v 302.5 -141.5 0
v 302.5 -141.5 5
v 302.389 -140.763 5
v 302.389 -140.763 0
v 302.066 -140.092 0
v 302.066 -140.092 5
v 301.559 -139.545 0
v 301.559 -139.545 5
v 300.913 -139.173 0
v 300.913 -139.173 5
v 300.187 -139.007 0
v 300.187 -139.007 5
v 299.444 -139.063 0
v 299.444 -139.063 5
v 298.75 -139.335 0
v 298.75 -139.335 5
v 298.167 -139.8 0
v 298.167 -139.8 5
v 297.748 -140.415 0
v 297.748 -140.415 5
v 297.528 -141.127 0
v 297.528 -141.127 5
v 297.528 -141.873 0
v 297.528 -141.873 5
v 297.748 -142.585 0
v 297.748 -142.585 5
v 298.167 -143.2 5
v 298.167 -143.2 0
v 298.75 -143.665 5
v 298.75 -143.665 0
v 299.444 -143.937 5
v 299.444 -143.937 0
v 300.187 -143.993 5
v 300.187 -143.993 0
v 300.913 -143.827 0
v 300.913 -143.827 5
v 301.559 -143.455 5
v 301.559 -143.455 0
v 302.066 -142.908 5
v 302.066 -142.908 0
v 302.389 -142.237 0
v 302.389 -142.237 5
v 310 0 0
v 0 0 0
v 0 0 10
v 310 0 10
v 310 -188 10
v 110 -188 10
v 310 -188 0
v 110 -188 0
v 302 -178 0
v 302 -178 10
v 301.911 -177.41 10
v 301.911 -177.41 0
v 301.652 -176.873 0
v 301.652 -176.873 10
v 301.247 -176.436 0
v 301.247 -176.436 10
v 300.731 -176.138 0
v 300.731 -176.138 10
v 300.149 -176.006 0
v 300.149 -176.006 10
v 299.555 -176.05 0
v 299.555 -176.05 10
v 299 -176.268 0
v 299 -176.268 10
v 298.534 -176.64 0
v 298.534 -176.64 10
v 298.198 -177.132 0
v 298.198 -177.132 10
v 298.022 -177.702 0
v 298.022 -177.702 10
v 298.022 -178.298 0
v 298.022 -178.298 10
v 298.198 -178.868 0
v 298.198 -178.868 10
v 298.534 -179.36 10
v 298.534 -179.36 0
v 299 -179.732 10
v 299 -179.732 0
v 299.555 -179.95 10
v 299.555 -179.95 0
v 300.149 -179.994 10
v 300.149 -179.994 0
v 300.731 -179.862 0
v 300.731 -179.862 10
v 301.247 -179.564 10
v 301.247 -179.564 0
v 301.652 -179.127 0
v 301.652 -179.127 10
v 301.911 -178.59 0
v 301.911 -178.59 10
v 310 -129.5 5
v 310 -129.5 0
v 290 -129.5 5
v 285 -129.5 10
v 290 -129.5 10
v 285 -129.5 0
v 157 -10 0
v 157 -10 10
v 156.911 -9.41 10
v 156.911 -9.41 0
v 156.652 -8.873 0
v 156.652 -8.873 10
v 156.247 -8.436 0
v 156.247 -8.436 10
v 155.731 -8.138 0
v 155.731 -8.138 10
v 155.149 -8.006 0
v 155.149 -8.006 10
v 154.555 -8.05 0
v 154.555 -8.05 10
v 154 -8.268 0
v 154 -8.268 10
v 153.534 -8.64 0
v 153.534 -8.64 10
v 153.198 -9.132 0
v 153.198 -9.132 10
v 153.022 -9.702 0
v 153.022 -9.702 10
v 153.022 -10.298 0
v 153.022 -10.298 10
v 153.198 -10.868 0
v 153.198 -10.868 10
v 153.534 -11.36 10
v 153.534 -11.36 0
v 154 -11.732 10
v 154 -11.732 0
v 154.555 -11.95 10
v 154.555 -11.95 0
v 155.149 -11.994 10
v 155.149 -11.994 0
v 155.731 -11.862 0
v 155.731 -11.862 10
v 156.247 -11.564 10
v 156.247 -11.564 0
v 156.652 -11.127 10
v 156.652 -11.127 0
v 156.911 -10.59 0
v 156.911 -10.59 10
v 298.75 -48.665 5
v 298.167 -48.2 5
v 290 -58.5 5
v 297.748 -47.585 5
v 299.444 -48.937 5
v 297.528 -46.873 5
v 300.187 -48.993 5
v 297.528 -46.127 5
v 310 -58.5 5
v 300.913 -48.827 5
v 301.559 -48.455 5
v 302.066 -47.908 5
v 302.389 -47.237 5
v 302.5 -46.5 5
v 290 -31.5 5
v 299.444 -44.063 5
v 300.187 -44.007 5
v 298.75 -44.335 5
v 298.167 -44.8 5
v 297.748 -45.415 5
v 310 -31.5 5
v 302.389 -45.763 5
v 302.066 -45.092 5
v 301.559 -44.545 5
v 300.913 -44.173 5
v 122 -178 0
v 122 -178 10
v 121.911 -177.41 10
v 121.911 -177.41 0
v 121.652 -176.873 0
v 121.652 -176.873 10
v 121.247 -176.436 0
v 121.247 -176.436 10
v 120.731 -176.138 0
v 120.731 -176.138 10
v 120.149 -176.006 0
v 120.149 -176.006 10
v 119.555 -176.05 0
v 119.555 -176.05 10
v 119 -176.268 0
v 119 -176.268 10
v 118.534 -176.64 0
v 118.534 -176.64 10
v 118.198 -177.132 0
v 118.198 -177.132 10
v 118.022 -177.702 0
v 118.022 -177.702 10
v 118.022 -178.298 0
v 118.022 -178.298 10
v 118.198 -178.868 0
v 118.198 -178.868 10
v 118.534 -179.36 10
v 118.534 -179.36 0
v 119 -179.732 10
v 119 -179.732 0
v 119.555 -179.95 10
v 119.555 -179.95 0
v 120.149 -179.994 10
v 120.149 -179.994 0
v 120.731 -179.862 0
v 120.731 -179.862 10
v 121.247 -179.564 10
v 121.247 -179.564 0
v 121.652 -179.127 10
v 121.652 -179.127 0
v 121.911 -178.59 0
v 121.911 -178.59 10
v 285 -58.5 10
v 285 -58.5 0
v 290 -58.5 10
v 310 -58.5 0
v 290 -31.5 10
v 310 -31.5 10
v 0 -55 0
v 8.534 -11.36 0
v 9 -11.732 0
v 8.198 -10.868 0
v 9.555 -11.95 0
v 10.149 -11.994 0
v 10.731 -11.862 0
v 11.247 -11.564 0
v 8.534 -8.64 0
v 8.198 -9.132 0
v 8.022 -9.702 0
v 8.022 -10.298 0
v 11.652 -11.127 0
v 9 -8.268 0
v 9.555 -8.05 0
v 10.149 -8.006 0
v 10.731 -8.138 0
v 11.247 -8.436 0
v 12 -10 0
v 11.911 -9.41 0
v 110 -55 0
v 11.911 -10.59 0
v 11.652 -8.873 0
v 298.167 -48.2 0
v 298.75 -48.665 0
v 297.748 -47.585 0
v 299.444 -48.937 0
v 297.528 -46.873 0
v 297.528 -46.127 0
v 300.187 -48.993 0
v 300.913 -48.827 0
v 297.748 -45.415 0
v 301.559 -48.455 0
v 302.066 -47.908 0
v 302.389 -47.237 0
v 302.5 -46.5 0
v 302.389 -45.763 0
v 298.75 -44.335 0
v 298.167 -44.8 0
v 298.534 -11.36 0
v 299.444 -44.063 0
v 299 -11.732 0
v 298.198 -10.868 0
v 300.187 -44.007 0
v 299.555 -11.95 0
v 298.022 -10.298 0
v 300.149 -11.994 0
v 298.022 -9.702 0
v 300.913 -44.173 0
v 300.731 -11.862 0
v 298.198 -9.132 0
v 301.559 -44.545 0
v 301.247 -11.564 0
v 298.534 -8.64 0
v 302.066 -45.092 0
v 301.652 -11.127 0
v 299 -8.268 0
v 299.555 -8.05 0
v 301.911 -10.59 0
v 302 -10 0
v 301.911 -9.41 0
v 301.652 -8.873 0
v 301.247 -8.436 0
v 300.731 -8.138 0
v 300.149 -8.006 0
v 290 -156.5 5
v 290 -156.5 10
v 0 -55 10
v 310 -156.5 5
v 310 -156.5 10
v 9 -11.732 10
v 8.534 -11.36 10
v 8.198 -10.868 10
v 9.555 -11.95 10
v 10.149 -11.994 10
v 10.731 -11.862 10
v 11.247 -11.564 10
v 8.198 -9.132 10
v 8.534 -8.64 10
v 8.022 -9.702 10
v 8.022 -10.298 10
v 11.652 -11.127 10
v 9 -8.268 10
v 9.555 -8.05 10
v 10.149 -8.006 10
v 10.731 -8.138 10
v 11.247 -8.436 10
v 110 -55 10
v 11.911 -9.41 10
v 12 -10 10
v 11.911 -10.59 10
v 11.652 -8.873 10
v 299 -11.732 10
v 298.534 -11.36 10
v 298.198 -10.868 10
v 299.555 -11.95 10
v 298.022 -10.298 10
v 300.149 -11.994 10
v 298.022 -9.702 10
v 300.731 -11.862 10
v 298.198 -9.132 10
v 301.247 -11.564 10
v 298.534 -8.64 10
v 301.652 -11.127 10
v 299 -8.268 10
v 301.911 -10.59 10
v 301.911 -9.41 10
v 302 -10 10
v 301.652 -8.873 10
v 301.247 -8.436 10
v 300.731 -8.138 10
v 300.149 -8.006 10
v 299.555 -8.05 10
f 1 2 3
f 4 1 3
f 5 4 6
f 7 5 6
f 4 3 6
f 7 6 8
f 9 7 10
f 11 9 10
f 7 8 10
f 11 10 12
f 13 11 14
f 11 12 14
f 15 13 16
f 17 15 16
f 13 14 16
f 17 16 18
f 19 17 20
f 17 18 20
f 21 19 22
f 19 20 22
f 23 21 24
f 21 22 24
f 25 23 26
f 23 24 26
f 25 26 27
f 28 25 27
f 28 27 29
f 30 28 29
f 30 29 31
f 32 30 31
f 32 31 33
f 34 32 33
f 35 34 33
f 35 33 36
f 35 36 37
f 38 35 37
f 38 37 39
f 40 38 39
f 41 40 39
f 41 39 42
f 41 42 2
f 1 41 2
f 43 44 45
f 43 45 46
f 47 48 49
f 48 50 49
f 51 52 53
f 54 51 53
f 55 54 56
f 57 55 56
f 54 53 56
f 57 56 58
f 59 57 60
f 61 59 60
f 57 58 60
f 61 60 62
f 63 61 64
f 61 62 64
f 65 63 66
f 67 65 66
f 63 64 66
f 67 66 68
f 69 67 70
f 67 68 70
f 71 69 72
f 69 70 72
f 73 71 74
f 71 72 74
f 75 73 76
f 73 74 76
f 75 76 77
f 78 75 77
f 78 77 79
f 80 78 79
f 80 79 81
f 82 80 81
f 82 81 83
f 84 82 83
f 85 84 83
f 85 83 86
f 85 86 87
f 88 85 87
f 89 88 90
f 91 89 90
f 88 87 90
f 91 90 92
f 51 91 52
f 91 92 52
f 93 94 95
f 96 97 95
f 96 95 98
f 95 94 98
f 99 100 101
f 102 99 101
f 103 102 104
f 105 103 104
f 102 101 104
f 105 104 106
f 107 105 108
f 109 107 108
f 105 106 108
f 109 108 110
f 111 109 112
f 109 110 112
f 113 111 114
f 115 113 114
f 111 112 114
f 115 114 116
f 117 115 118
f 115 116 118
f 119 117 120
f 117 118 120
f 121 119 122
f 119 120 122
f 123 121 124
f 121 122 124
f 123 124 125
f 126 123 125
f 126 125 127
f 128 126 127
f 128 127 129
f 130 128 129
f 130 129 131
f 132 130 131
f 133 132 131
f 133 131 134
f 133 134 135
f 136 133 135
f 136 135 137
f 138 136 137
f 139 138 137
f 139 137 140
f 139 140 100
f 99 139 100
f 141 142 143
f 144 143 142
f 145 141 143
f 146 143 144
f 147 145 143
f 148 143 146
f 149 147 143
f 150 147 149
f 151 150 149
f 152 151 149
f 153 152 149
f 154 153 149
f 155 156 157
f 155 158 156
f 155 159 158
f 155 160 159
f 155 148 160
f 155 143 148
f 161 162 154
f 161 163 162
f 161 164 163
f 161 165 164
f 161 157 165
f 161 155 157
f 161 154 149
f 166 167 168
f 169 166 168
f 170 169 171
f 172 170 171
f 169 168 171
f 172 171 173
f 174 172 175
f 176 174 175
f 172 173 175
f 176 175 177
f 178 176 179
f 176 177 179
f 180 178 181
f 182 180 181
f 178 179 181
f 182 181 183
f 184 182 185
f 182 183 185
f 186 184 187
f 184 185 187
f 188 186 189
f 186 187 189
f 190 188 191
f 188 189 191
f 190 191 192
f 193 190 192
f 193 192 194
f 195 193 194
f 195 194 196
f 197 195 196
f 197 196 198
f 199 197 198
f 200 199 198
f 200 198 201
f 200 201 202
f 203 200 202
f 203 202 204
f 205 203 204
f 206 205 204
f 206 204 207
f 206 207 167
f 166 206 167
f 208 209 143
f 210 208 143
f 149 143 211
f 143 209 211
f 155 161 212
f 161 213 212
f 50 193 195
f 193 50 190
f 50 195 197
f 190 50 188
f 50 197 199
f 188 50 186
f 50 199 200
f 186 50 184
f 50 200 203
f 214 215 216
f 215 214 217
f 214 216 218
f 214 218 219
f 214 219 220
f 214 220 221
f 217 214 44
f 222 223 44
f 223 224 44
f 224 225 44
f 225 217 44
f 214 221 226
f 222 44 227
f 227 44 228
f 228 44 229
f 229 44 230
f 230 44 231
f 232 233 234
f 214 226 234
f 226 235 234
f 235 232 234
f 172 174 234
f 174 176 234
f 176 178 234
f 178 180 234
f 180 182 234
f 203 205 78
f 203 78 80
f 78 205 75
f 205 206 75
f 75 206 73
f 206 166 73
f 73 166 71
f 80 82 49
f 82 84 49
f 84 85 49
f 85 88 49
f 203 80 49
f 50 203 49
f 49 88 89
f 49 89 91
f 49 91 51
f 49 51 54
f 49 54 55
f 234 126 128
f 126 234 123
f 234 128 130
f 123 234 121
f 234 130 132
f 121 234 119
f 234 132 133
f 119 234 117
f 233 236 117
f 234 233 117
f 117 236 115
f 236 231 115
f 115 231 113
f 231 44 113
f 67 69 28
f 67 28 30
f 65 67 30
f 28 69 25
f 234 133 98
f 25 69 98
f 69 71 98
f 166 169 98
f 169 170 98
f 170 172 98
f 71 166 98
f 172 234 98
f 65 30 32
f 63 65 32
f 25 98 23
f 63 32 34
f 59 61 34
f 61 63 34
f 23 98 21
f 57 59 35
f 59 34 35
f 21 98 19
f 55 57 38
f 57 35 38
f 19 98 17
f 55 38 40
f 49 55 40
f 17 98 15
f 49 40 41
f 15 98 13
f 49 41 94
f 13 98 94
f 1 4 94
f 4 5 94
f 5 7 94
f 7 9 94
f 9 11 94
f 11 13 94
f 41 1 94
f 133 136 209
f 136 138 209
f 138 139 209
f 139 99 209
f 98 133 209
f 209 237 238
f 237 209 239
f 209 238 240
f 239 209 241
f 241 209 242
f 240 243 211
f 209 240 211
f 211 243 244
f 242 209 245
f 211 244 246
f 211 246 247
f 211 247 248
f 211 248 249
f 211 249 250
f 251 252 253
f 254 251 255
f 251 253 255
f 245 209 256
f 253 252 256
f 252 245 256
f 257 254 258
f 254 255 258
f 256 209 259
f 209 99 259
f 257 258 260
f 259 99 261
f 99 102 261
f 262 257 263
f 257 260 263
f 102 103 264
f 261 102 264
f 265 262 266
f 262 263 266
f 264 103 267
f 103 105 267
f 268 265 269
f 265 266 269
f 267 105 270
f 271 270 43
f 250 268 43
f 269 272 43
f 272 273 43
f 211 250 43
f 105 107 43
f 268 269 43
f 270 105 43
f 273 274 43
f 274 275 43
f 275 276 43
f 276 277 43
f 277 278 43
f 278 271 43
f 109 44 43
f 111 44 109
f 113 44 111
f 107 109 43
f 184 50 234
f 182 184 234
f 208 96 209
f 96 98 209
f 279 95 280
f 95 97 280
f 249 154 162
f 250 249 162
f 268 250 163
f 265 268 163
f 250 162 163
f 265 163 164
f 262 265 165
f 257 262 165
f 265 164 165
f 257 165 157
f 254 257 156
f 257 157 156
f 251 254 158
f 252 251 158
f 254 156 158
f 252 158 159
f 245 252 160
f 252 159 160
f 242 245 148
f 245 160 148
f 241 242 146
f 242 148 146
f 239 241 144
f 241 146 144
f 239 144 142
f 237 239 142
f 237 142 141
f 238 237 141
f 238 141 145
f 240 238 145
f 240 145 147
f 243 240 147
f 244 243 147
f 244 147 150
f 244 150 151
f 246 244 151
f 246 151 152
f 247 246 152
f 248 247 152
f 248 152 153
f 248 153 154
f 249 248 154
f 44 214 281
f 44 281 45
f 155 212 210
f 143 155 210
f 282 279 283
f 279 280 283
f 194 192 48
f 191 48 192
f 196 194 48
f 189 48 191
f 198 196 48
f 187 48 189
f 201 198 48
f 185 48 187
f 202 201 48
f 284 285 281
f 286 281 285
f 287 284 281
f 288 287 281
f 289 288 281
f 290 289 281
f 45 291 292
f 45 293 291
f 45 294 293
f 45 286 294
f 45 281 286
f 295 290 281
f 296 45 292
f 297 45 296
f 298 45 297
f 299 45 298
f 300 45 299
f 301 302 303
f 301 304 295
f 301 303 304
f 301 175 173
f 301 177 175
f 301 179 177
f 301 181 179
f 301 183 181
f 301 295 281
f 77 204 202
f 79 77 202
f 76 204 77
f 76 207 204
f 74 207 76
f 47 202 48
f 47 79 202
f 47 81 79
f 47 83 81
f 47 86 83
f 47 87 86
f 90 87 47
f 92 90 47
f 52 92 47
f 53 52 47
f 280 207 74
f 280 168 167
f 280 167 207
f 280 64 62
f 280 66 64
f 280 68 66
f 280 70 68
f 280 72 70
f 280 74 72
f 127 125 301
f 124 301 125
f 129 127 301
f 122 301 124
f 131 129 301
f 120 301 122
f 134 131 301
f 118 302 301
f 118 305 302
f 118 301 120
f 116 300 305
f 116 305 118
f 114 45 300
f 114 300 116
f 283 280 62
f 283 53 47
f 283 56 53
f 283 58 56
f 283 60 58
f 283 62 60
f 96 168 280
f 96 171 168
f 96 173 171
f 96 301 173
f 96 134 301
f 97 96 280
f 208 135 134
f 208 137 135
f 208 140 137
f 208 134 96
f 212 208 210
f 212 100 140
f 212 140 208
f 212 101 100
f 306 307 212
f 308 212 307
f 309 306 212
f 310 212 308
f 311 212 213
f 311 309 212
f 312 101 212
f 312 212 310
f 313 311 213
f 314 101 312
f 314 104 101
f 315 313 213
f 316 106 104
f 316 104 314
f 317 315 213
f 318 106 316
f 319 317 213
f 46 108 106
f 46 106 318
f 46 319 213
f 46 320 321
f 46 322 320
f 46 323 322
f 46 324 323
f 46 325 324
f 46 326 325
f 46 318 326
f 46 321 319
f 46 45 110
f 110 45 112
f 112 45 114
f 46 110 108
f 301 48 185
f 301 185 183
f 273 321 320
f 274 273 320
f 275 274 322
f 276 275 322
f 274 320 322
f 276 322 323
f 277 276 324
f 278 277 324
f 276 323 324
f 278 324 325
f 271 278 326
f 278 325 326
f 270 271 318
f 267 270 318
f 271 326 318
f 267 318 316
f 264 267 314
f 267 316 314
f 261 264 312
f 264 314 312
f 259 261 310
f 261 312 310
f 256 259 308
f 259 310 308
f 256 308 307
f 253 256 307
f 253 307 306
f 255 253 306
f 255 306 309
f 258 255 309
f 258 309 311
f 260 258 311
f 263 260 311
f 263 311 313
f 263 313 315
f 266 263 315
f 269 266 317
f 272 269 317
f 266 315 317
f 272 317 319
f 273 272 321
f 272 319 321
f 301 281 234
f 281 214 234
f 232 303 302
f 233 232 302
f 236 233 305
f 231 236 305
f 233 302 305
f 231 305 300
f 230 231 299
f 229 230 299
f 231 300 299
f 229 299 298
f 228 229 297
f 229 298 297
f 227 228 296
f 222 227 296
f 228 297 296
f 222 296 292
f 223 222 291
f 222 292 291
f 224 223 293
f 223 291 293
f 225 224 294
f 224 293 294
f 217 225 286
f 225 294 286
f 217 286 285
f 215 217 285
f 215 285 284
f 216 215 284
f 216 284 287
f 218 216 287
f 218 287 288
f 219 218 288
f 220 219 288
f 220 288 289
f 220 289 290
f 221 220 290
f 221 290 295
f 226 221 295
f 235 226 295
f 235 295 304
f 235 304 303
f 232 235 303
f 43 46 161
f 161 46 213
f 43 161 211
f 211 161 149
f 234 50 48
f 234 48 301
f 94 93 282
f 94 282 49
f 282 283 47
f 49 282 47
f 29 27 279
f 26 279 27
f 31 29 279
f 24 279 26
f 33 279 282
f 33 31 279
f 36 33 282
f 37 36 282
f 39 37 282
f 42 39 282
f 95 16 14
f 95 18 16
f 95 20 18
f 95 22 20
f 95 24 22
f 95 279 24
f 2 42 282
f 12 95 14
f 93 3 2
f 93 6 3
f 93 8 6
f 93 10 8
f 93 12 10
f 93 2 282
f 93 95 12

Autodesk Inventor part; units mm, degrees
ref_plane "YZ Plane" through (0, 0, 0) normal (1, 0, 0) x (0, 1, 0)
ref_plane "XZ Plane" through (0, 0, 0) normal (0, 1, 0) x (-1, 0, 0)
ref_plane "XY Plane" through (0, 0, 0) normal (0, 0, 1) x (1, 0, 0)
sketch "Sketch1" plane through (0, 0, 0) normal (0, 0, 1) x (1, 0, 0)
  line L0 (0, 0) -> (620, 0)
  line L1 (110, -188) -> (510, -188)
  line L2 (510, -188) -> (510, -55)
  line L3 (510, -55) -> (620, -55)
  line L4 (620, -55) -> (620, 0)
  line L5 (110, -188) -> (110, -55)
  line L6 (0, -55) -> (0, 0)
  line L7 (0, -55) -> (110, -55)
  point P0 (310, -188)
  point P1 (310, 0)
  dimension "d0" = 620
  dimension "d1" = 188
  dimension "d2" = 400
  dimension "d3" = 133
extrude "Extrusion1" add sketch "Sketch1" along normal blind 10
sketch "Sketch2" plane through (0, 0, 10) normal (0, 0, 1) x (1, 0, 0)
  line L0 (620, 0) -> (0, 0) projected
  line L1 (510, -188) -> (110, -188) projected
  line L2 (620, 0) -> (310, 0)
  line L3 (310, 0) -> (310, -188)
  line L4 (310, -188) -> (620, -188)
  line L5 (620, -188) -> (620, 0)
extrude "Extrusion2" cut sketch "Sketch2" against normal through all
sketch "Sketch3" plane through (0, 0, 10) normal (0, 0, 1) x (1, 0, 0)
  circle A0 centre (10, -10) radius 2
  line L0 (310, 0) -> (0, 0) projected
  line L1 (0, 0) -> (0, -55) projected
  circle A1 centre (155, -10) radius 2
  circle A2 centre (300, -10) radius 2
  line L2 (310, -188) -> (310, 0) projected
  line L3 (10, -10) -> (300, -10) construction
  circle A3 centre (120, -178) radius 2
  line L4 (110, -55) -> (110, -188) projected
  line L5 (110, -188) -> (310, -188) projected
  circle A4 centre (300, -178) radius 2
  dimension "d8" = 4
  dimension "d9" = 10
  dimension "d10" = 10
  dimension "d11" = 4
  dimension "d12" = 4
  dimension "d13" = 10
  dimension "d14" = 4
  dimension "d15" = 10
  dimension "d16" = 10
  dimension "d17" = 4
  dimension "d18" = 10
  dimension "d19" = 10
extrude "Extrusion3" cut sketch "Sketch3" against normal through all
sketch "Sketch6" plane through (0, 0, 10) normal (0, 0, 1) x (1, 0, 0)
  line L0 (310, -31.5) -> (290, -31.5)
  line L1 (290, -31.5) -> (290, -156.5)
  line L2 (290, -156.5) -> (310, -156.5)
  line L3 (310, -156.5) -> (310, -31.5)
  line L4 (310, -188) -> (310, 0) projected
  point P0 (0, 0)
  point P1 (310, -94)
  dimension "d42" = 20
  dimension "d43" = 125
extrude "Extrusion6" cut sketch "Sketch6" against normal blind 5
sketch "Sketch7" plane through (0, 0, 5) normal (0, 0, 1) x (1, 0, 0)
  line L0 (300, -46.5) -> (300, -141.5) construction
  circle A0 centre (300, -46.5) radius 2.5
  circle A1 centre (300, -141.5) radius 2.5
  line L1 (310, -31.5) -> (310, -156.5) projected
  point P0 (0, 0)
  point P1 (300, -94)
  point P2 (310, -94)
  dimension "d46" = 5
  dimension "d47" = 5
  dimension "d48" = 10
  dimension "d49" = 95
extrude "Extrusion7" cut sketch "Sketch7" against normal through all
sketch "Sketch8" plane through (0, 0, 0) normal (0, 0, -1) x (-1, 0, 0)
  line L0 (-285, -58.5) -> (-335, -58.5)
  line L1 (-335, -58.5) -> (-335, -129.5)
  line L2 (-335, -129.5) -> (-285, -129.5)
  line L3 (-285, -129.5) -> (-285, -58.5)
  line L4 (-310, 0) -> (-310, -188) projected
  point P0 (0, 0)
  point P1 (-335, -94)
  point P2 (-310, -94)
  point P3 (-310, -58.5)
  dimension "d52" = 50
  dimension "d53" = 71
extrude "Extrusion8" cut sketch "Sketch8" against normal through all
properties part number "SP001b" material "ABS Plastic"
